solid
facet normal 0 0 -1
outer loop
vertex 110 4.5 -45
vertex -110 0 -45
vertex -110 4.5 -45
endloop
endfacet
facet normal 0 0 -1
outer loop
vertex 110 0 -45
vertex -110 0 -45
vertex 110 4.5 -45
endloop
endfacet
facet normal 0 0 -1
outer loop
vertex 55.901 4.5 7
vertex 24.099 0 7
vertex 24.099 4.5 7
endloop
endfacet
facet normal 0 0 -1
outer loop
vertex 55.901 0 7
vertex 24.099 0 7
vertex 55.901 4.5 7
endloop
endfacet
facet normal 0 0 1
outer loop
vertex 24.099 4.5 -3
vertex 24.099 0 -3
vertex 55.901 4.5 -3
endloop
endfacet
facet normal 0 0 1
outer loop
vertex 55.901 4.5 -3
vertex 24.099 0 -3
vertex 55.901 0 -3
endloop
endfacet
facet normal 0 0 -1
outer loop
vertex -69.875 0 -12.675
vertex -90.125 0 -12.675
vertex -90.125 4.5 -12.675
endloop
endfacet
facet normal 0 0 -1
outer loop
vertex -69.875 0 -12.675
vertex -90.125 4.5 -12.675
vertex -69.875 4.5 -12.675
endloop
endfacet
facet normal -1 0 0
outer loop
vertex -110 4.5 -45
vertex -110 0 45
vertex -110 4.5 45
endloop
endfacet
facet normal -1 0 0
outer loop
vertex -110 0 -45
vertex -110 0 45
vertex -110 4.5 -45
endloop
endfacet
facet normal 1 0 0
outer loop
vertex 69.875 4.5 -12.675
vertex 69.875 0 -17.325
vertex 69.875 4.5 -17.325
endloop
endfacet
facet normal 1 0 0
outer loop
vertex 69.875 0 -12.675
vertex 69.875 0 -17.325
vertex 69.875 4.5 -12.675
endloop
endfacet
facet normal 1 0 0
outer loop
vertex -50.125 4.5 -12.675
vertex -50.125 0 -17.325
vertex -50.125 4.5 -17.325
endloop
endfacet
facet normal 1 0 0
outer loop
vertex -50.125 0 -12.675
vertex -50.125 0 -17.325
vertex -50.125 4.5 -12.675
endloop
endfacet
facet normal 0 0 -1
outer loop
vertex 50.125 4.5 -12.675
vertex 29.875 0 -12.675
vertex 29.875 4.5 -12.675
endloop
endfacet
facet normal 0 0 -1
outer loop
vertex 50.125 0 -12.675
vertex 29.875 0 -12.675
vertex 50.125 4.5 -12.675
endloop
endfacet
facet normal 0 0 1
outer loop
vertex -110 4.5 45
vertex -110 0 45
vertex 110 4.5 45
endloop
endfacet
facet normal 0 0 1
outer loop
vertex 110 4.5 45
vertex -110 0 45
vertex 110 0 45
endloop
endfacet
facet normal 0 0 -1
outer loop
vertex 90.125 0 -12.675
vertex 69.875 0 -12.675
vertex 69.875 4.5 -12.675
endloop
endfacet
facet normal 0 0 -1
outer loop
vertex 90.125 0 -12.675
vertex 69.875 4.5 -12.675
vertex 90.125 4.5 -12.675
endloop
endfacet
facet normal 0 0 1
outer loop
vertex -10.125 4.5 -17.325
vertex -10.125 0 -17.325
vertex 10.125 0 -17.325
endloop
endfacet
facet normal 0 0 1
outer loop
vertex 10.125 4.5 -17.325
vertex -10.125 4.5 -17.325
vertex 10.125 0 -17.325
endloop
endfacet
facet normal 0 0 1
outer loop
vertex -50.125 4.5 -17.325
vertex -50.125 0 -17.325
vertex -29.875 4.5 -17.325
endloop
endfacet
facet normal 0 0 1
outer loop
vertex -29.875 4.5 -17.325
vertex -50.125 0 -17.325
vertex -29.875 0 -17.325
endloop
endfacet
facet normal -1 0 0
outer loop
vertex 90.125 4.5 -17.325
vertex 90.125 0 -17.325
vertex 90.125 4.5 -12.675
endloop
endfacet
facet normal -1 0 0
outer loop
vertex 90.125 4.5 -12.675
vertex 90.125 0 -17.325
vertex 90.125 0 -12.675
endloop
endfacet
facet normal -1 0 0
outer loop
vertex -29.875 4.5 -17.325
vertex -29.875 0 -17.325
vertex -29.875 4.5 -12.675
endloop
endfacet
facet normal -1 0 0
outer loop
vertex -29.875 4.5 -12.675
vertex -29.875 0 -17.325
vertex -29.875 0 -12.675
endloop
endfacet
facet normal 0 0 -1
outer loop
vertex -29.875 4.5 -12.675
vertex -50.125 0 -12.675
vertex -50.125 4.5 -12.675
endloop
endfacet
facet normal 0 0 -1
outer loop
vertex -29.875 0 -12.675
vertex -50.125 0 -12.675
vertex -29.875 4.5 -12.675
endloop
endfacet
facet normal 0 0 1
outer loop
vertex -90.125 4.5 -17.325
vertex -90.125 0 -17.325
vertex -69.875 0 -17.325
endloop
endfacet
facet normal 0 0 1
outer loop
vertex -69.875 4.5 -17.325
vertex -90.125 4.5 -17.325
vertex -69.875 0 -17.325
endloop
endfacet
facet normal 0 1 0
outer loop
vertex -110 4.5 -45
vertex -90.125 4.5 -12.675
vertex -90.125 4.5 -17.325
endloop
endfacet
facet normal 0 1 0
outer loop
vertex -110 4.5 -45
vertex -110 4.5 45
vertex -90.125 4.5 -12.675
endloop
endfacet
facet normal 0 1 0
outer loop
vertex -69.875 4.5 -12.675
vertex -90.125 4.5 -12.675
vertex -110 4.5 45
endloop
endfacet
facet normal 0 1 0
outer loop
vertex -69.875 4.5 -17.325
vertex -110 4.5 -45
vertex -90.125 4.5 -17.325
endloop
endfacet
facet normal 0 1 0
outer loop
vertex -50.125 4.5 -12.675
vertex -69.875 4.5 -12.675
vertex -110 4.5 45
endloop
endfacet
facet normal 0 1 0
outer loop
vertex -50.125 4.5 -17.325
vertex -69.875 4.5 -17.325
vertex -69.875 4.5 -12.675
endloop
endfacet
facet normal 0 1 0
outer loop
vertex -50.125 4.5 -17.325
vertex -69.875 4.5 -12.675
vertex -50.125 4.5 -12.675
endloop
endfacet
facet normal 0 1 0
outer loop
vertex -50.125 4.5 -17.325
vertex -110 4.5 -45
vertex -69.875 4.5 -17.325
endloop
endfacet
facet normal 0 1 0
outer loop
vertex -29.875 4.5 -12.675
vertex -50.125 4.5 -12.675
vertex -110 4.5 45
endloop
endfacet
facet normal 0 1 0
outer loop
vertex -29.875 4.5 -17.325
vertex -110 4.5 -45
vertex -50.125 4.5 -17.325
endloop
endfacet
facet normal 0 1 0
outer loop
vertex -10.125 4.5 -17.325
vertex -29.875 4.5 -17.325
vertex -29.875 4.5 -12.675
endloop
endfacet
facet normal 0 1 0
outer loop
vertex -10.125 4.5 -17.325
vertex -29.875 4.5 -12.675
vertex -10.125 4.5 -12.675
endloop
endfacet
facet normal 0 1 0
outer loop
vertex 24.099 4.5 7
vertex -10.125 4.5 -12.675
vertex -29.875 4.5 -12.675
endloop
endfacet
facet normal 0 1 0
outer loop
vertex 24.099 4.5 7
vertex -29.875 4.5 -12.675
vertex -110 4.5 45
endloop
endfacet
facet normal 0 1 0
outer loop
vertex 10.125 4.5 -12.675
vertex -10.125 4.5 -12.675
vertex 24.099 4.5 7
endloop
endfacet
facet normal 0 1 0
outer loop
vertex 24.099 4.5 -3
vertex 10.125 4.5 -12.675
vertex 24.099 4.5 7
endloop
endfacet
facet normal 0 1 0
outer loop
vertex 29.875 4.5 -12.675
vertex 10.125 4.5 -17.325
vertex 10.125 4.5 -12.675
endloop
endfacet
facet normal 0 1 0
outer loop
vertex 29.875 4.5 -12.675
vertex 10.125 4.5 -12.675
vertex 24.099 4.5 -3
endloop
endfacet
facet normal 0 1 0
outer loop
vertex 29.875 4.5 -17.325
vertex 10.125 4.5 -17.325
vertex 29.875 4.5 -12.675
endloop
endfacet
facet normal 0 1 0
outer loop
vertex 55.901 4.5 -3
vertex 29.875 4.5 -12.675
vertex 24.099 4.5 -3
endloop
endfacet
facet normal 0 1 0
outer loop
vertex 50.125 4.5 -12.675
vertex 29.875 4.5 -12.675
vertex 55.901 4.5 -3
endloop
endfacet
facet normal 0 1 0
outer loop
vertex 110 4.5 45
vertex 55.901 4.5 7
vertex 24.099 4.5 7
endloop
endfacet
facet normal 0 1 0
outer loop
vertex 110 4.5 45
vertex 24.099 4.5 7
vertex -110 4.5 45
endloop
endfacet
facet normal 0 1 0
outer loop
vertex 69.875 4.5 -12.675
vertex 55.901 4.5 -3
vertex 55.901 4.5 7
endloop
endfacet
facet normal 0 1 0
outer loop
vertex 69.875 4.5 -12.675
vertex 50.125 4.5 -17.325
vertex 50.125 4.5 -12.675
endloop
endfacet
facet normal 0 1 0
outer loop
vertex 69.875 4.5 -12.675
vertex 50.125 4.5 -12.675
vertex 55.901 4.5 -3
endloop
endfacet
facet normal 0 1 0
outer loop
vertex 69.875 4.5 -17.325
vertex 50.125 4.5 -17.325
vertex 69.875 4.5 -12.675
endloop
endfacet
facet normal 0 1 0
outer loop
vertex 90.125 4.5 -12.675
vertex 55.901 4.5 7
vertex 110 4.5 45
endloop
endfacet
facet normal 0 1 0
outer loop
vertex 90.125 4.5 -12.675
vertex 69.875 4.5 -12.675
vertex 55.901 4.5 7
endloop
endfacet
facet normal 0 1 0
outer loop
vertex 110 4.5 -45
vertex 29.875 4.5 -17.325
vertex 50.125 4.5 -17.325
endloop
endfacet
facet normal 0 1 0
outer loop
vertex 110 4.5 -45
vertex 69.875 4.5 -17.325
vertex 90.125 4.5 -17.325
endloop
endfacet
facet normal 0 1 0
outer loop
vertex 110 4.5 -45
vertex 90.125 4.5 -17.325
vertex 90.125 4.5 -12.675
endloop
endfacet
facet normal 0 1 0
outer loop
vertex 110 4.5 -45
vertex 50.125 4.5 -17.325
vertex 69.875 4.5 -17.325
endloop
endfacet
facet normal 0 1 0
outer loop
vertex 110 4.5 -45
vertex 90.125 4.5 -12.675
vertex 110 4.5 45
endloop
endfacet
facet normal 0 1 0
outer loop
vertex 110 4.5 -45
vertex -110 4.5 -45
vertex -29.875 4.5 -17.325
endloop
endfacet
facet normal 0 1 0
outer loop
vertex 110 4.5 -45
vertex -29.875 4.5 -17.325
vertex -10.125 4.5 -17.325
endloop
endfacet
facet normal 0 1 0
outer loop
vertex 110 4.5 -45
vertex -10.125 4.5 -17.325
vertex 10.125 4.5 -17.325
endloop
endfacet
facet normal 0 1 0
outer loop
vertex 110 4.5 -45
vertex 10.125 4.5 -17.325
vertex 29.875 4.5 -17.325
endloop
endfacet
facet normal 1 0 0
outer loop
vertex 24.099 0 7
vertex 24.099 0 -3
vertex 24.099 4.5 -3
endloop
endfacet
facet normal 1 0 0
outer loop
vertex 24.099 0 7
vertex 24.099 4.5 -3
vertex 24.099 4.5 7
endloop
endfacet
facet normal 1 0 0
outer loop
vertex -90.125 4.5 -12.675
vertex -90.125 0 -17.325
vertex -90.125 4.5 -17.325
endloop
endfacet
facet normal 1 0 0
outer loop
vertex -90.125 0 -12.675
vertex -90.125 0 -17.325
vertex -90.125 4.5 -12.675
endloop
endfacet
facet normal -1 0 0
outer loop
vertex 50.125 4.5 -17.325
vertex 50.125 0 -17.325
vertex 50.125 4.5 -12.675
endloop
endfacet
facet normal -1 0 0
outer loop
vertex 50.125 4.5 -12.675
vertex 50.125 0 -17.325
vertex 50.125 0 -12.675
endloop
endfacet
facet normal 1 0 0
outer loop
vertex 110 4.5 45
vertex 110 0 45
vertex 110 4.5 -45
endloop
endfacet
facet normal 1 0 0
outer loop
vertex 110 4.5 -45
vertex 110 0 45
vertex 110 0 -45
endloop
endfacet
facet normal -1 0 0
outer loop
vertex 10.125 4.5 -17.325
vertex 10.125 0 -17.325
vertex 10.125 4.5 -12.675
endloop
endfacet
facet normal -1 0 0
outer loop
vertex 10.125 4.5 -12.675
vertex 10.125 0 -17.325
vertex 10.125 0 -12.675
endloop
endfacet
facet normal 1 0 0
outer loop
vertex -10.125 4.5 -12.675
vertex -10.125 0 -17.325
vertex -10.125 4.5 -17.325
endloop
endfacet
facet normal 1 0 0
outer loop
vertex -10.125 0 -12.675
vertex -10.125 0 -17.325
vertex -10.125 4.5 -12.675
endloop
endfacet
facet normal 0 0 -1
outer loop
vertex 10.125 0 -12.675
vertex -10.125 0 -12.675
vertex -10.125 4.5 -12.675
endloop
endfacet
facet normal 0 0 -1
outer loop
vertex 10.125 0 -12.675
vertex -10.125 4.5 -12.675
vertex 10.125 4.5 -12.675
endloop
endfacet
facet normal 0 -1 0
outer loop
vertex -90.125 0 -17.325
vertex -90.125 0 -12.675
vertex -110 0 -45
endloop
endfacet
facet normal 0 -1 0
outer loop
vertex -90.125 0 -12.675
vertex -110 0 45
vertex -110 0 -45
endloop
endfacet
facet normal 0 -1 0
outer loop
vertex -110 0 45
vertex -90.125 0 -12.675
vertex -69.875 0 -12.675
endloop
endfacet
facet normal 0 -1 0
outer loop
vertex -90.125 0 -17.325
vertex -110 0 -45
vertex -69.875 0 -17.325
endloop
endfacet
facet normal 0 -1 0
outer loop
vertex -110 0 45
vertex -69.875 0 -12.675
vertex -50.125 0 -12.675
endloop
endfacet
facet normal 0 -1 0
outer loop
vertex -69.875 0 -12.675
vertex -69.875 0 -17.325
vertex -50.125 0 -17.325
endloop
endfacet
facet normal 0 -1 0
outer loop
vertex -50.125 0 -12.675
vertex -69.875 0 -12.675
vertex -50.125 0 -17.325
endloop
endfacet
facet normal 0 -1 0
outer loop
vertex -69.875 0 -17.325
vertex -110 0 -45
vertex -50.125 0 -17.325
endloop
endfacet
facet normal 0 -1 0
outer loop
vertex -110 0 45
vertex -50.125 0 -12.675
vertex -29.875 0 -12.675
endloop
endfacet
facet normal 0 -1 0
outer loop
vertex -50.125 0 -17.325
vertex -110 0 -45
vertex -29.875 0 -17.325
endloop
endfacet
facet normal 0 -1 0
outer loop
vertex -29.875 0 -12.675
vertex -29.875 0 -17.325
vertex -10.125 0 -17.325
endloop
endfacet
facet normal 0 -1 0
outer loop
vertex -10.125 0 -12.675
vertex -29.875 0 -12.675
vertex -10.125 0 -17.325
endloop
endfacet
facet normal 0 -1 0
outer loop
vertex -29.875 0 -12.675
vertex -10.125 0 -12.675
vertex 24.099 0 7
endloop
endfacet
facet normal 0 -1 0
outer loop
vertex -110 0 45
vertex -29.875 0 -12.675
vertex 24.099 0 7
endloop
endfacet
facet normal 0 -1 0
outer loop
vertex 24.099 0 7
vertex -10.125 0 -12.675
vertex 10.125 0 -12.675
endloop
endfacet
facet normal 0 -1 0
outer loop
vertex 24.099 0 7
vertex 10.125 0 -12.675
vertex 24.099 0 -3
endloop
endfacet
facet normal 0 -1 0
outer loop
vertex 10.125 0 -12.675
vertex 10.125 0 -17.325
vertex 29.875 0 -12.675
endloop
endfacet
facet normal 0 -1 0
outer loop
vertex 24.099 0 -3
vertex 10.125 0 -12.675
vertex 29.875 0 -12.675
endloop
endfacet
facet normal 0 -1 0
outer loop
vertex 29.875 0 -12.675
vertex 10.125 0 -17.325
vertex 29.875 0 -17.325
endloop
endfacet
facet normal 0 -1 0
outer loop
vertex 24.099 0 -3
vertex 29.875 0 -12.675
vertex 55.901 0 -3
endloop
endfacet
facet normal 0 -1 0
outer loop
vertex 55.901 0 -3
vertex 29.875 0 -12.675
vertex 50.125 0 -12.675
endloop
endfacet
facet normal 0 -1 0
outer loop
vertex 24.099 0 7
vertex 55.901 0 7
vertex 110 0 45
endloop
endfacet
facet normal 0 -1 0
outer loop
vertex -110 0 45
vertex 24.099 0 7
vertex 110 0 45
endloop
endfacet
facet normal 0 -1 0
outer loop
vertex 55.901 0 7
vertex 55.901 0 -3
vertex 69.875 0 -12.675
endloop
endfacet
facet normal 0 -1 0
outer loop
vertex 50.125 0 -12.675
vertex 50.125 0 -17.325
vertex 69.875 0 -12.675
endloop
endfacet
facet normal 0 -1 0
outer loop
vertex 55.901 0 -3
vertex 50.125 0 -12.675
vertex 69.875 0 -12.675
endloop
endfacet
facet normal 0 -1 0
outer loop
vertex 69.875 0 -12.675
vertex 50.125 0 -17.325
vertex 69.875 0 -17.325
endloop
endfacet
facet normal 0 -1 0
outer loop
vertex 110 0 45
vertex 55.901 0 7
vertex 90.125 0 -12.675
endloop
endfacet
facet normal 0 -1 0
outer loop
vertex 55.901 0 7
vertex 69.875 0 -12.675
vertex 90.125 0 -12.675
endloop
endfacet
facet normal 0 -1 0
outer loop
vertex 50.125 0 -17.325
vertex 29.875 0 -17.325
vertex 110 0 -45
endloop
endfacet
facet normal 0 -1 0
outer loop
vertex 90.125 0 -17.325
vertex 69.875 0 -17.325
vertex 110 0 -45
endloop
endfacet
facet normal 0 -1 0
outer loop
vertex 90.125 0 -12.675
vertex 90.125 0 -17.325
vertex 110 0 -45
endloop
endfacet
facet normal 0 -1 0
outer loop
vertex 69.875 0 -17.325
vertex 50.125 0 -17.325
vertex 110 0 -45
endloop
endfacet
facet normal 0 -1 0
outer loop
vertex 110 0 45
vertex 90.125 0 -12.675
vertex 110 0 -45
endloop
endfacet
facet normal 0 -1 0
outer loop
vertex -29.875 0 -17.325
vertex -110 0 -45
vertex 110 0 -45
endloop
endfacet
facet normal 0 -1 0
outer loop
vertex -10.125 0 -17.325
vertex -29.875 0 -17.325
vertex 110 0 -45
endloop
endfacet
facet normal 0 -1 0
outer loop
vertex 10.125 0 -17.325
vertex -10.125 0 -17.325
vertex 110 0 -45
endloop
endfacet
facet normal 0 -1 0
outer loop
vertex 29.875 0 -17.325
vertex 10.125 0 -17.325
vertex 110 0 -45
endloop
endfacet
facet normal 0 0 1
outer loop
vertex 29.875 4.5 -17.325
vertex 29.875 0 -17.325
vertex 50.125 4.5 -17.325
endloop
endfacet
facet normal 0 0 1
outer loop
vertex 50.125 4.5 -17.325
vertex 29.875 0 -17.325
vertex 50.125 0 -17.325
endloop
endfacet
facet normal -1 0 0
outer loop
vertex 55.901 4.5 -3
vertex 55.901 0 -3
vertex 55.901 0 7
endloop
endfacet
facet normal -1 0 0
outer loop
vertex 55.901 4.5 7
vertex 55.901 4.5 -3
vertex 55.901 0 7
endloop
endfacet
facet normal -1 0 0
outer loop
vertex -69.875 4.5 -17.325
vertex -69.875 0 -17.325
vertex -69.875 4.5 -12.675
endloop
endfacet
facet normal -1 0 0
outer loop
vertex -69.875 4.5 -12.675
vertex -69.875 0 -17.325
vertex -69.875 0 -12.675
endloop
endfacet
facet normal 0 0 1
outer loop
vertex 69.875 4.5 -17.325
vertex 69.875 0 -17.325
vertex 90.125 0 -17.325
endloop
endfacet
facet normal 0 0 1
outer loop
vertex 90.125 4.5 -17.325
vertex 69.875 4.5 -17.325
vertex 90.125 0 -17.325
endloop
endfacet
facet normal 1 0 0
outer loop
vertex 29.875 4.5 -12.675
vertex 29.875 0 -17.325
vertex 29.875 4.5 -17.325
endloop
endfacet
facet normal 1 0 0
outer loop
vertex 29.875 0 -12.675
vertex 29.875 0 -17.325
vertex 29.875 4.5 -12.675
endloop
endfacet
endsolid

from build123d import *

# Parameters (mm, degrees)
SKETCH2_W            = 220
SKETCH2_H            = 90
BOSS_EXTRUDE1_DEPTH  = 4.5
SKETCH3_W            = 20.25
SKETCH3_H            = 4.65
CUT_EXTRUDE1_DEPTH   = 119.933805119
SKETCH4_W            = 31.802775074
SKETCH4_H            = 10
INPUT_LINK_CUT_DEPTH = 119.933805119


with BuildPart() as part:
    # Sketch2 → Boss-Extrude1 (new body)
    with BuildSketch(Plane(origin=(0, 0, 0), x_dir=(1, 0, 0), z_dir=(0, 1, 0))):
        Rectangle(SKETCH2_W, SKETCH2_H)
    extrude(amount=BOSS_EXTRUDE1_DEPTH)

    # Sketch3 → Cut-Extrude1 (cut, through all)
    with BuildSketch(Plane.XZ):
        with Locations((40, -15)):
            Rectangle(SKETCH3_W, SKETCH3_H)
        with Locations((0, -15)):
            Rectangle(SKETCH3_W, SKETCH3_H)
        with Locations((80, -15)):
            Rectangle(SKETCH3_W, SKETCH3_H)
        with Locations((-80, -15)):
            Rectangle(SKETCH3_W, SKETCH3_H)
        with Locations((-40, -15)):
            Rectangle(SKETCH3_W, SKETCH3_H)
    extrude(amount=-CUT_EXTRUDE1_DEPTH, mode=Mode.SUBTRACT)

    # Sketch4 → Input link cut (cut, through all)
    with BuildSketch(Plane.XZ):
        with Locations((40, 2)):
            Rectangle(SKETCH4_W, SKETCH4_H)
    extrude(amount=-INPUT_LINK_CUT_DEPTH, mode=Mode.SUBTRACT)


solid = part.part
